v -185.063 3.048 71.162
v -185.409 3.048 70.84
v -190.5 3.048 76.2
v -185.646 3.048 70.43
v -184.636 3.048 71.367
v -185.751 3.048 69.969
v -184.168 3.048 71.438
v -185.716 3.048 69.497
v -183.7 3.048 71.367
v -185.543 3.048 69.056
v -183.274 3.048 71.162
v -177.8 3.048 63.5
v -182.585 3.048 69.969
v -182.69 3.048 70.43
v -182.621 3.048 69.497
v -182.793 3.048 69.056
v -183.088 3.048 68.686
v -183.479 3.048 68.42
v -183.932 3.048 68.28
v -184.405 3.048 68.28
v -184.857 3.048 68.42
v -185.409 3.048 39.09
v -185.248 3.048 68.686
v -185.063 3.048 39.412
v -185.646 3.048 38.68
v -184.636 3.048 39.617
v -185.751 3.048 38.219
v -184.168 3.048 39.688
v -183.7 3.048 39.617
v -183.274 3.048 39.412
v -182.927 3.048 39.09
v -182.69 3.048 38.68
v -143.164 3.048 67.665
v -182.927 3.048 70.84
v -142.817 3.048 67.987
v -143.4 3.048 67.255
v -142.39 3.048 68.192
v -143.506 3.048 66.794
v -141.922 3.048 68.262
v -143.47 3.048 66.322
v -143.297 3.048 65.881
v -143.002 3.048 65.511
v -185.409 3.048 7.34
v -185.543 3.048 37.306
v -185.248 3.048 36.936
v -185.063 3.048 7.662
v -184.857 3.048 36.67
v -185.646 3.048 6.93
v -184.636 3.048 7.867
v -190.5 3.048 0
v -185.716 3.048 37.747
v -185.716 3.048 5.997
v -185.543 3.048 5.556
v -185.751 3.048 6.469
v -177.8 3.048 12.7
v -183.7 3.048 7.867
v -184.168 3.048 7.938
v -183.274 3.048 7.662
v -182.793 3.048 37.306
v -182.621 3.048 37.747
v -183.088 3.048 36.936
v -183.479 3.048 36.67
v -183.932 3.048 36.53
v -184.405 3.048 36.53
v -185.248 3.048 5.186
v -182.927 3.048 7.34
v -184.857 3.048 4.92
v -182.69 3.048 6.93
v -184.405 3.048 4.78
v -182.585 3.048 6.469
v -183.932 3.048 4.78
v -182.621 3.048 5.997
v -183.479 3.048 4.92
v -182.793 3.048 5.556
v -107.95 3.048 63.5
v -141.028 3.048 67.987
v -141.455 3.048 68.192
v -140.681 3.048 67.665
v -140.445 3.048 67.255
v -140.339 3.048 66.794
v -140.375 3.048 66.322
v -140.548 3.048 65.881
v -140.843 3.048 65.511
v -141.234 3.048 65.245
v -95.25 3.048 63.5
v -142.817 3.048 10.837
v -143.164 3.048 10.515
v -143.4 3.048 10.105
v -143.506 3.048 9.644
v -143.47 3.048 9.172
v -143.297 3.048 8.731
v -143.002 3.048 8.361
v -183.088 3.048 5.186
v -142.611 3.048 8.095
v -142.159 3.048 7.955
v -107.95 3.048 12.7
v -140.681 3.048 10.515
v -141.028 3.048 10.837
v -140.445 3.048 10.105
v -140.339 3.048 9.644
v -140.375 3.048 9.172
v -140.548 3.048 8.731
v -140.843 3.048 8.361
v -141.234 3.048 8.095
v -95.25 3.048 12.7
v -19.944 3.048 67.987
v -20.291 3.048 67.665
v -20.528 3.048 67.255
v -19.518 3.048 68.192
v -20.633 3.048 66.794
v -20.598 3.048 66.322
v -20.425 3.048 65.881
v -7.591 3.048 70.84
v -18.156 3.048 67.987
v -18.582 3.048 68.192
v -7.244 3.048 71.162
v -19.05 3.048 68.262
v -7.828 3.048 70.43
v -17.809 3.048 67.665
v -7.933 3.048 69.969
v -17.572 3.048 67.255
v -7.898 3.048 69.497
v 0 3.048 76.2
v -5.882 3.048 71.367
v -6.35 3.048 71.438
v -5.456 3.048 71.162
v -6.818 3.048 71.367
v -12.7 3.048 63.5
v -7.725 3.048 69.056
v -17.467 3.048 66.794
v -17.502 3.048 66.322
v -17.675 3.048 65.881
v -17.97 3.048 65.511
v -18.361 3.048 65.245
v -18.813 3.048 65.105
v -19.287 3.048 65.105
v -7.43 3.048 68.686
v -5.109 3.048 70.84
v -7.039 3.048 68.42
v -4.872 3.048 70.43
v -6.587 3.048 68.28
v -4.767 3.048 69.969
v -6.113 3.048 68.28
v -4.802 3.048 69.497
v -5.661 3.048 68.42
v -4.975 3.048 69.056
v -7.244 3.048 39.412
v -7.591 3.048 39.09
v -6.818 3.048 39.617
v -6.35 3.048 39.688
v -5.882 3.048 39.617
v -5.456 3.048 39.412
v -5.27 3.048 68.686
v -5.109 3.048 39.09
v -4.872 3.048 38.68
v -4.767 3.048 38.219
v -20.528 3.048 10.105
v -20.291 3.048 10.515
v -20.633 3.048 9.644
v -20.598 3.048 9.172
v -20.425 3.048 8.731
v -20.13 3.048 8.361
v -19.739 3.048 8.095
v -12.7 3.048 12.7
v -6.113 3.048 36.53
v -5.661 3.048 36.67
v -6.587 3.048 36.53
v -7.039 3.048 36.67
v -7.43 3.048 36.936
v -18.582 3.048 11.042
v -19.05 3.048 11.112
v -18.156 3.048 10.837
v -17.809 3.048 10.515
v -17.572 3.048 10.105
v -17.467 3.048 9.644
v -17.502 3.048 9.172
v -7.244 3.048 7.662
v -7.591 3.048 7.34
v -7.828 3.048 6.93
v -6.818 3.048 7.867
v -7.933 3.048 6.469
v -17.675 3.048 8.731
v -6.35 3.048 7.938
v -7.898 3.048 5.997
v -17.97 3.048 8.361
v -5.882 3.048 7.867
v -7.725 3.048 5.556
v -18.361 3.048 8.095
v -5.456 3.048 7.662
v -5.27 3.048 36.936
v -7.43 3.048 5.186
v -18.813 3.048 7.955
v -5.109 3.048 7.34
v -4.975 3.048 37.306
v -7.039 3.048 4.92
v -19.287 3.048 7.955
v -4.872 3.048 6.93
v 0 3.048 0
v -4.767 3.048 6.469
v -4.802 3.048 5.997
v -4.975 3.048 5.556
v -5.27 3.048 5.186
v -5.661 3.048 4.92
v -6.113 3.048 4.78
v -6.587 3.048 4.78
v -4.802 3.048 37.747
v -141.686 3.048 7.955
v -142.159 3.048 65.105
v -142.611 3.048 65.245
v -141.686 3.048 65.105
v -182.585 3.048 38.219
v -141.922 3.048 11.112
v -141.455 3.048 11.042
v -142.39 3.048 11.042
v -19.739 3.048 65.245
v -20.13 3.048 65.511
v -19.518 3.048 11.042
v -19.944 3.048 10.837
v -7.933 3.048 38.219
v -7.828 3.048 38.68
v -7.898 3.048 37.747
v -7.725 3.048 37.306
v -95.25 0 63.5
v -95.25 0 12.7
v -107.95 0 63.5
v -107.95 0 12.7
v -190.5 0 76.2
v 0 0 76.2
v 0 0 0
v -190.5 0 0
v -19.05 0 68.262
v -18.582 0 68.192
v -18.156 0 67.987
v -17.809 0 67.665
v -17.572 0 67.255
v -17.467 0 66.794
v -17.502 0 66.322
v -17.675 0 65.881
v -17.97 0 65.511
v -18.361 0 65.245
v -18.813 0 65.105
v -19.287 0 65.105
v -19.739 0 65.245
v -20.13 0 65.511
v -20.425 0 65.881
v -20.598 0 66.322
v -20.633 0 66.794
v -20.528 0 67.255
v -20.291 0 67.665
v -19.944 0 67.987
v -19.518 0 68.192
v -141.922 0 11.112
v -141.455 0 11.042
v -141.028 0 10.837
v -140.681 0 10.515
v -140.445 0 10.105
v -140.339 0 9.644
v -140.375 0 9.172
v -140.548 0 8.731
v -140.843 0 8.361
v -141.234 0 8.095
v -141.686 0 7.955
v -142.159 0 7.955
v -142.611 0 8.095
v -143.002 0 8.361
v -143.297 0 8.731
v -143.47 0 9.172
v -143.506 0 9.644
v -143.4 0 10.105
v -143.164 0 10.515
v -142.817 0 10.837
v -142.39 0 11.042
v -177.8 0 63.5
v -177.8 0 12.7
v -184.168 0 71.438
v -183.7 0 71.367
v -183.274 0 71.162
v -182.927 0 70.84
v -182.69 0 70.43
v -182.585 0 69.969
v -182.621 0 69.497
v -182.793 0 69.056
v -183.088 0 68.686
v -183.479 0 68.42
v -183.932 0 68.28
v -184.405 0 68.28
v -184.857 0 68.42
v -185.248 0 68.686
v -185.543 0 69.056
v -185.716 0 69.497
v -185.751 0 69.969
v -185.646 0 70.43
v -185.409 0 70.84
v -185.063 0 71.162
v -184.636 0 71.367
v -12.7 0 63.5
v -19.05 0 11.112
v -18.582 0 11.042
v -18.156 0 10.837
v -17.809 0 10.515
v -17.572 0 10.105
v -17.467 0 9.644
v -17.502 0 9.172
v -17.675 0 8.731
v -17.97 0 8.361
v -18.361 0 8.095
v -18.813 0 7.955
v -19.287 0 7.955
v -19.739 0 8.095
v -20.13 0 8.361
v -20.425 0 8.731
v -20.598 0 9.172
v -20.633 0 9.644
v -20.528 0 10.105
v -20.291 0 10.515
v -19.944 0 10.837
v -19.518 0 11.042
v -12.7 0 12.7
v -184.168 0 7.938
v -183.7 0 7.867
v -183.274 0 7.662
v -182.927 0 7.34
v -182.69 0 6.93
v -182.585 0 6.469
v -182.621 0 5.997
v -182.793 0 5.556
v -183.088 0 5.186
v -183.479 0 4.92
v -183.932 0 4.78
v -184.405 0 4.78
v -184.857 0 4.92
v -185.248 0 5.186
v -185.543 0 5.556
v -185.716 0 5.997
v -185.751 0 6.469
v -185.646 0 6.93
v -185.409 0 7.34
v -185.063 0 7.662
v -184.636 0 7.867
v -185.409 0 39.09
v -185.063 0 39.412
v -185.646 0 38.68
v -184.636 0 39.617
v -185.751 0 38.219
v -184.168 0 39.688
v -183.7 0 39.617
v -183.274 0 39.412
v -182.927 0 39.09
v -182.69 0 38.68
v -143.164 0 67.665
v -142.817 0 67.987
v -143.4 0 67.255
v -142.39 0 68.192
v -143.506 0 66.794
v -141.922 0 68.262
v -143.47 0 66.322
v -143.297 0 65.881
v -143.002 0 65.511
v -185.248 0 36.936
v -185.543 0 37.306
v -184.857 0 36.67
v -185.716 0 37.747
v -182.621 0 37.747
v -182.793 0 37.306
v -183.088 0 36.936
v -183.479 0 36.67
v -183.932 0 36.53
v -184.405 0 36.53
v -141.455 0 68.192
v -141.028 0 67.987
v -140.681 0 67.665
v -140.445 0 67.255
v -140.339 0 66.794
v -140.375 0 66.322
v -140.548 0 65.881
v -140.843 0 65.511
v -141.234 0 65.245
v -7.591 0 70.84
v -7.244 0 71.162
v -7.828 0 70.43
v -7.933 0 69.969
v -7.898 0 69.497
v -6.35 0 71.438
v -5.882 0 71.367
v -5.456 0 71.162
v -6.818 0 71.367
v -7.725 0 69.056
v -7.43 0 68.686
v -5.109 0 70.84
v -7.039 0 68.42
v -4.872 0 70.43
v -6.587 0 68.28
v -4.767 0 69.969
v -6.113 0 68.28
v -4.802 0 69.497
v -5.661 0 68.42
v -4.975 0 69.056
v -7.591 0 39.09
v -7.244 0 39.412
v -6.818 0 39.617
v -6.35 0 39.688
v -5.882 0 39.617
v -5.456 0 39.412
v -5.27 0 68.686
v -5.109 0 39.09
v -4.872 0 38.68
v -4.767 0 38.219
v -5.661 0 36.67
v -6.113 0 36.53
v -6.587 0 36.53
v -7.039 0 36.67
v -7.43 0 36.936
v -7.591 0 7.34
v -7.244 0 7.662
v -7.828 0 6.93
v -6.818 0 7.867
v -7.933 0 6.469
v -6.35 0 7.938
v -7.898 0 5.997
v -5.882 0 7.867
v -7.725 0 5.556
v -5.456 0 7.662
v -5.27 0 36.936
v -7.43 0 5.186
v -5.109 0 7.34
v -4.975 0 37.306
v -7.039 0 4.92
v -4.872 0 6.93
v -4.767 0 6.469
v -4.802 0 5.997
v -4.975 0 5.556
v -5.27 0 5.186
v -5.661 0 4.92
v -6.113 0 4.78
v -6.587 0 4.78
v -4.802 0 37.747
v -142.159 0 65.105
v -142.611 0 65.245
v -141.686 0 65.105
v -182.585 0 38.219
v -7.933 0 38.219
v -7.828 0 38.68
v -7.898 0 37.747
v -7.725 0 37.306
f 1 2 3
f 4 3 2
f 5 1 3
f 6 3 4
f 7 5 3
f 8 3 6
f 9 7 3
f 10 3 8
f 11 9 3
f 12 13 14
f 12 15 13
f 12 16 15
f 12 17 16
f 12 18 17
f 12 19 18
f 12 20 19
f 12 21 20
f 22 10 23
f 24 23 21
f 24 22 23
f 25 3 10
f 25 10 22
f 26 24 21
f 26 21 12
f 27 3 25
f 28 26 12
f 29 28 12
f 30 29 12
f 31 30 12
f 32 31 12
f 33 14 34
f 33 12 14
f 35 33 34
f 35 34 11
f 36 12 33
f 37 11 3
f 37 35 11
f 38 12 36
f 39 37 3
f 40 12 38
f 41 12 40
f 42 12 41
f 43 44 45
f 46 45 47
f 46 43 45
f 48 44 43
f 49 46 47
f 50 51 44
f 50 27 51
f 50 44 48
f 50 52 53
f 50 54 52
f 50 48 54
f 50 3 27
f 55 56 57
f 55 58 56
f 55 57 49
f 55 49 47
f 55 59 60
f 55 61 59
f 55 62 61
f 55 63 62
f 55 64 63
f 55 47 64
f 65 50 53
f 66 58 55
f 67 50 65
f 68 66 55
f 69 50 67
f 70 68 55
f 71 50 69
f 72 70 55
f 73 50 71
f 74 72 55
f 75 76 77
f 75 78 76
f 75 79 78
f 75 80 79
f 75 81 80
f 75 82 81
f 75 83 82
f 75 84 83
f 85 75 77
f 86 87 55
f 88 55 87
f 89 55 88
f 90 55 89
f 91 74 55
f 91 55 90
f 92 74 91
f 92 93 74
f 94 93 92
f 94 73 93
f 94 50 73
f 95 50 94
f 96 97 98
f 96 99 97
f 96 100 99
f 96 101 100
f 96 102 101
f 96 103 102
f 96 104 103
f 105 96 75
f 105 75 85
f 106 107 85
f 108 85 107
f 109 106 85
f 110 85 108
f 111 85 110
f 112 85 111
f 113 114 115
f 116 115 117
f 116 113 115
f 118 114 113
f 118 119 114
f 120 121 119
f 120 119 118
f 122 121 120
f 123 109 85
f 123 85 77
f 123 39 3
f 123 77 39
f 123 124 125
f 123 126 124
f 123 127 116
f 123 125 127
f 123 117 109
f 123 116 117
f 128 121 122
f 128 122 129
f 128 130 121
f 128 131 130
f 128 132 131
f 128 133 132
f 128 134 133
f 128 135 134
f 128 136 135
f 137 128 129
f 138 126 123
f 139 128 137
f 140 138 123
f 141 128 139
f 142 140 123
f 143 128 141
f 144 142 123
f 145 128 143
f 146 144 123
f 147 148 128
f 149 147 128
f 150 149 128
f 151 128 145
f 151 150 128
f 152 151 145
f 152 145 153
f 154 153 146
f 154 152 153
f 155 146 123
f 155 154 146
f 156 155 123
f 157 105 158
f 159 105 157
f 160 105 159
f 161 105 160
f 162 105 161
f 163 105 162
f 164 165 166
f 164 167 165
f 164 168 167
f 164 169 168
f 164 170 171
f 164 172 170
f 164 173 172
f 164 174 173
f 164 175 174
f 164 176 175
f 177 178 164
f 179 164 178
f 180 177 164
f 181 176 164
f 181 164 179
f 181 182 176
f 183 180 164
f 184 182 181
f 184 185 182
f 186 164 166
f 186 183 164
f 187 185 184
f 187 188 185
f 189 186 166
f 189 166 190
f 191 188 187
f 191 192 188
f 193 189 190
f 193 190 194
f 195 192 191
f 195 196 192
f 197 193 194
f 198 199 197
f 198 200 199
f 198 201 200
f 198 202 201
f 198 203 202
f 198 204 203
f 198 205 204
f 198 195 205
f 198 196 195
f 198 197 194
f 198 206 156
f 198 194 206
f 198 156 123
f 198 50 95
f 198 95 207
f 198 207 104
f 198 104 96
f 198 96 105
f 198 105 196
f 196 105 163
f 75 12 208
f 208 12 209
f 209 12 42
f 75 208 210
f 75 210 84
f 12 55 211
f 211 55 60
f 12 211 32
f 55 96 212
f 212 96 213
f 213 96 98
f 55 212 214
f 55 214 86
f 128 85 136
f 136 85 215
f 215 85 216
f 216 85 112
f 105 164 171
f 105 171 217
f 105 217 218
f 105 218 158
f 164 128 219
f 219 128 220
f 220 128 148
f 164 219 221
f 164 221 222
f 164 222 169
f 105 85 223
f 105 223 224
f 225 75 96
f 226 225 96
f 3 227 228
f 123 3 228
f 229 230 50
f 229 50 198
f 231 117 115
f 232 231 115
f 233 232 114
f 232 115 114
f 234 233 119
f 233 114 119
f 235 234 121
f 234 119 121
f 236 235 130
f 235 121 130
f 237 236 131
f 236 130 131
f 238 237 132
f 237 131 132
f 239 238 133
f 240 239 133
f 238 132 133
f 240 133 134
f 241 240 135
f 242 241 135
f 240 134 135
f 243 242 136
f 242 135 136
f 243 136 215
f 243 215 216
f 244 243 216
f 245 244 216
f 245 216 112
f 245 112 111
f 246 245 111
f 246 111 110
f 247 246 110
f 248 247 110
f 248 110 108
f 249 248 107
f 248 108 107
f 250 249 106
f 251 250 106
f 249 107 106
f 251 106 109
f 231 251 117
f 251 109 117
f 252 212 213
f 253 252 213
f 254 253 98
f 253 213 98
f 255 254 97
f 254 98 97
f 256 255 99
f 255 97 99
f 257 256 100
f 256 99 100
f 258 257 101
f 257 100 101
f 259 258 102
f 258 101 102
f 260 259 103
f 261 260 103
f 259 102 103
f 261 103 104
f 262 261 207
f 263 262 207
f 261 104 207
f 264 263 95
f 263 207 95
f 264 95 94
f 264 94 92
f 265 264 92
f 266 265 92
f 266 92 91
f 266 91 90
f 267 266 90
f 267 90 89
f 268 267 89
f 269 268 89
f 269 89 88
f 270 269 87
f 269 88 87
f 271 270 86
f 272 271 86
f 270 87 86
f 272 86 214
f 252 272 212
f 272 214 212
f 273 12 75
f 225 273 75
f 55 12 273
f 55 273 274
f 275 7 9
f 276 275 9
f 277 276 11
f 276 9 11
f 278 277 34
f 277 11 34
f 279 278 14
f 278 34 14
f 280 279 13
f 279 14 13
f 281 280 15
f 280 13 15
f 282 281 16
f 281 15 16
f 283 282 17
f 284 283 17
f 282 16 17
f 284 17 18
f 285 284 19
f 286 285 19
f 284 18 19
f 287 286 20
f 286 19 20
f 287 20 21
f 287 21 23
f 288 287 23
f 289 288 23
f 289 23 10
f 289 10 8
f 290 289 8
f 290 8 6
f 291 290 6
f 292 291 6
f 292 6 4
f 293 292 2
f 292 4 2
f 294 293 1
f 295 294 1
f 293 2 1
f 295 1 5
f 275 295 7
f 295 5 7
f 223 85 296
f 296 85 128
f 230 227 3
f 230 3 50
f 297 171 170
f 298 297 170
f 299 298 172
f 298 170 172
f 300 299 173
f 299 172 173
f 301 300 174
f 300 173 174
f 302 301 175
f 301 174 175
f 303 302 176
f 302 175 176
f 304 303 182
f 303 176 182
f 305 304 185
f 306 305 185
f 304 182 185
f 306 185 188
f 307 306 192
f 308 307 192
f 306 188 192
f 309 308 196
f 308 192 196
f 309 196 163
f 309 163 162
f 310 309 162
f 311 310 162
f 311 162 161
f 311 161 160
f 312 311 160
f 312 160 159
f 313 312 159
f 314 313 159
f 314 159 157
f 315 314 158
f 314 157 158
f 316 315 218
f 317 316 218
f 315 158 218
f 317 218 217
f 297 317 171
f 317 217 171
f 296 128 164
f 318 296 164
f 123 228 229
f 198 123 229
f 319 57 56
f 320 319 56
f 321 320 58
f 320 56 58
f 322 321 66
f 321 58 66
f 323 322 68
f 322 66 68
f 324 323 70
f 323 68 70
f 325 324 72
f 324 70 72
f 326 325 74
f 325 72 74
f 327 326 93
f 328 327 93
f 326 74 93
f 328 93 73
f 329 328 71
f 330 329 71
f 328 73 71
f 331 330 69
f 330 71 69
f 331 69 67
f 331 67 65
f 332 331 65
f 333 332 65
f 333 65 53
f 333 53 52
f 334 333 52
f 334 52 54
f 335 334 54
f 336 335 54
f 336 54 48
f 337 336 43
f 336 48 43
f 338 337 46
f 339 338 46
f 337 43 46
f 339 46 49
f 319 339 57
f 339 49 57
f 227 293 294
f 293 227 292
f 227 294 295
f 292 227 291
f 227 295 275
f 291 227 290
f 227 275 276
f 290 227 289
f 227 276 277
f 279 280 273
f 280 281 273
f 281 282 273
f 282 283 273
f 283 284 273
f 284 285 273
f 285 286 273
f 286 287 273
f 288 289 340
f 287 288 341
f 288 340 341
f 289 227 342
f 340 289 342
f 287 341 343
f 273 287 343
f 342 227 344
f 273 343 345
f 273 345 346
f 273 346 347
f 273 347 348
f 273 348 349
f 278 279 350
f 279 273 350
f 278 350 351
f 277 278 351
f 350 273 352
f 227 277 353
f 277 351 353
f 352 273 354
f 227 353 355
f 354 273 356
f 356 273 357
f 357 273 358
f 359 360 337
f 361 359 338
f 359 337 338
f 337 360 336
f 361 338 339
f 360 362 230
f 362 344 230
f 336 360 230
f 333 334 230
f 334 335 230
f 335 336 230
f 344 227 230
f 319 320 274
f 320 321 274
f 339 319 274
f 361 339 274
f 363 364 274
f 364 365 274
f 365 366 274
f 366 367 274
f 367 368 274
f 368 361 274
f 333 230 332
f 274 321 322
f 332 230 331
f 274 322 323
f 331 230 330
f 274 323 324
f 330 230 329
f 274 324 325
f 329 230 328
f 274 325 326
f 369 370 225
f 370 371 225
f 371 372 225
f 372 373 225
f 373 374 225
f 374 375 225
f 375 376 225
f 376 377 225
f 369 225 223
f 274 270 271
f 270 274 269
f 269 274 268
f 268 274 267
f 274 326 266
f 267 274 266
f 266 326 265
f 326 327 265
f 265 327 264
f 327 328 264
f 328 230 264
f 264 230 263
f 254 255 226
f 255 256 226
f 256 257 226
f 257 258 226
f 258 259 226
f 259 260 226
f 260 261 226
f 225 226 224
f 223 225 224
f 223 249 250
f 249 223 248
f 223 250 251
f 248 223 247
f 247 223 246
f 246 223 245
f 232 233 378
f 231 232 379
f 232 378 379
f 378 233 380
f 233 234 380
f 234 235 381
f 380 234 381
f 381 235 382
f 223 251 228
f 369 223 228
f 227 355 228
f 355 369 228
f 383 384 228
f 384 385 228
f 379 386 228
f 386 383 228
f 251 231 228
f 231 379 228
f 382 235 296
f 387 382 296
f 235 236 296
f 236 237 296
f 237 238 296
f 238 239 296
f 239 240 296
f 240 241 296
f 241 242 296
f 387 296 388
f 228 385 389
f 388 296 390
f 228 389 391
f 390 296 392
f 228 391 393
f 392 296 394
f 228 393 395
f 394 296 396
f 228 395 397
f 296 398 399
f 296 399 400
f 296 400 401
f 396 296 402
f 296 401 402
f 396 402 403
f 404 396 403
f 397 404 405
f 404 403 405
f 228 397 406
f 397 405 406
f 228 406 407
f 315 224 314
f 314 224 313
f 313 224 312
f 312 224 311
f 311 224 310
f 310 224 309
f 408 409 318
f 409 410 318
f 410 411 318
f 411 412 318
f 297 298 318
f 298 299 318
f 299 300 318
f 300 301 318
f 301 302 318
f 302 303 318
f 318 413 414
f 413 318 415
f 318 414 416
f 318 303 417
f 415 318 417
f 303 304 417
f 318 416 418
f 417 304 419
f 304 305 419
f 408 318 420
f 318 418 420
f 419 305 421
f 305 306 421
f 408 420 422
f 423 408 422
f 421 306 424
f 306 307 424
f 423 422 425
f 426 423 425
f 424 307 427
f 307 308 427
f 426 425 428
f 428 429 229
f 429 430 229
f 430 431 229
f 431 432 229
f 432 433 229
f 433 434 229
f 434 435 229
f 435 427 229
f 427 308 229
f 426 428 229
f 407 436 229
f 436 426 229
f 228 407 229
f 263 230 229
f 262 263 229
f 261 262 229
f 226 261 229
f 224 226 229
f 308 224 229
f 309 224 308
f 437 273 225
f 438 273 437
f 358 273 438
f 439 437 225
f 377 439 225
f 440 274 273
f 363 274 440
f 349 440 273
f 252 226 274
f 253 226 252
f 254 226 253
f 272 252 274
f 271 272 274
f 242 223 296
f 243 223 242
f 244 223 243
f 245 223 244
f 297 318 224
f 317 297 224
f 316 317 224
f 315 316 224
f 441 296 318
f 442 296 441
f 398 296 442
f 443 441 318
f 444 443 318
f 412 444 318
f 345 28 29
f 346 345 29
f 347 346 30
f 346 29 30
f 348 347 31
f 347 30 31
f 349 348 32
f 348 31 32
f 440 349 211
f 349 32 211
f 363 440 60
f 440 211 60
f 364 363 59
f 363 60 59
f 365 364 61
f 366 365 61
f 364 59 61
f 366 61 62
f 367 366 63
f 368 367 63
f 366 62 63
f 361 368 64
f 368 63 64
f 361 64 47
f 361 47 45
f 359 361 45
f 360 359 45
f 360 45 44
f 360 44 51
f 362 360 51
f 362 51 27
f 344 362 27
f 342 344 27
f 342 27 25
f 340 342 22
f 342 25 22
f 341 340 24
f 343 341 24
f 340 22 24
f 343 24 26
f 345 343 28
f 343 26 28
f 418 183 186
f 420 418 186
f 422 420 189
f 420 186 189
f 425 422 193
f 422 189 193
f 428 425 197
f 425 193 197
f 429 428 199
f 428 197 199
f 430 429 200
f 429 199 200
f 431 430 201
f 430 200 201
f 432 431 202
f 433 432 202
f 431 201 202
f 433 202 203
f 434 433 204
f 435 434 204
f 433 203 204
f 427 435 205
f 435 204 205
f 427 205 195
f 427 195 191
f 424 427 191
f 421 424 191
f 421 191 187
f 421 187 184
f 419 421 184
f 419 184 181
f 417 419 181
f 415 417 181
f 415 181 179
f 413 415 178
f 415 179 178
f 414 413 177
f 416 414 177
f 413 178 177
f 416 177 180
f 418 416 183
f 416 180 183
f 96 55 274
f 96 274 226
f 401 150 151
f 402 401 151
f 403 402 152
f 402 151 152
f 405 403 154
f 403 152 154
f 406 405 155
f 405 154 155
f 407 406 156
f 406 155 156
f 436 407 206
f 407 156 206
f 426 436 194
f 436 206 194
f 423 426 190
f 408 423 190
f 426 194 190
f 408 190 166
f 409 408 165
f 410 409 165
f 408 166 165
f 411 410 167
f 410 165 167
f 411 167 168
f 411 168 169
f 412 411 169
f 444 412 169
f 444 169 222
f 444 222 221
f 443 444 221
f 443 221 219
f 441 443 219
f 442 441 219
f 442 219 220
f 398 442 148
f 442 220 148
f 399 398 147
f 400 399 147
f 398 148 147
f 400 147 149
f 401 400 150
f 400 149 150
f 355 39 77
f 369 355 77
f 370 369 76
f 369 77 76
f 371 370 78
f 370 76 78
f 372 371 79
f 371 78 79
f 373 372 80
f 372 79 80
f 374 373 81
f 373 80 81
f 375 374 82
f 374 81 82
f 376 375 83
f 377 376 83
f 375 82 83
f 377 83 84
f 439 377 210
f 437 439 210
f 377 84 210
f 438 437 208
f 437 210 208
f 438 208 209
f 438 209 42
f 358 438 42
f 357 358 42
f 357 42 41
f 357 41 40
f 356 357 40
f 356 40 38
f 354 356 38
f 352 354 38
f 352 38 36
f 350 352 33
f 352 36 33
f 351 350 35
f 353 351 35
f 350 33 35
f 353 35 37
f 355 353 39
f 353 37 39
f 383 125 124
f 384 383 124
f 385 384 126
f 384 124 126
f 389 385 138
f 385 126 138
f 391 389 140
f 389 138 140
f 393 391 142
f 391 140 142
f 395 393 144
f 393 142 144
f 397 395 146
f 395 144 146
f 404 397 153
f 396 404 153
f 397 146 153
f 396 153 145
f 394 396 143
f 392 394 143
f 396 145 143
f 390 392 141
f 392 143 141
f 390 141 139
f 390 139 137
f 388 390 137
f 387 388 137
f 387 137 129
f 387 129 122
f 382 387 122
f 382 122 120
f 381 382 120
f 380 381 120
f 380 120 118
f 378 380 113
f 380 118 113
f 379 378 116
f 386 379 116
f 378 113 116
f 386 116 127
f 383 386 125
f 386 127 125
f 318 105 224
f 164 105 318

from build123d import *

# Parameters (mm, degrees)
SKETCH1_W           = 190.5
SKETCH1_H           = 76.2
BOSS_EXTRUDE1_DEPTH = 3.048
SKETCH2_W           = 82.55
SKETCH2_H           = 50.8
SKETCH2_W_2         = 69.85
CUT_EXTRUDE1_DEPTH  = 3.048
SKETCH3_R           = 1.5875
CUT_EXTRUDE2_DEPTH  = 3.048


with BuildPart() as part:
    # Sketch1 → Boss-Extrude1 (new body)
    with BuildSketch(Plane(origin=(0, 0, 0), x_dir=(1, 0, 0), z_dir=(0, 1, 0))):
        with Locations((-95.25, -38.1)):
            Rectangle(SKETCH1_W, SKETCH1_H)
    extrude(amount=BOSS_EXTRUDE1_DEPTH)

    # Sketch2 → Cut-Extrude1 (cut)
    with BuildSketch(Plane(origin=(0, 3.048, 0), x_dir=(1, 0, 0), z_dir=(0, 1, 0))):
        with Locations((-53.975, -38.1)):
            Rectangle(SKETCH2_W, SKETCH2_H)
        with Locations((-142.875, -38.1)):
            Rectangle(SKETCH2_W_2, SKETCH2_H)
    extrude(amount=-CUT_EXTRUDE1_DEPTH, mode=Mode.SUBTRACT)

    # Sketch3 → Cut-Extrude2 (cut)
    with BuildSketch(Plane(origin=(0, 3.048, 0), x_dir=(1, 0, 0), z_dir=(0, 1, 0))):
        with Locations(Location((-6.35, -38.1, 0), (0, 0, 270))):
            Circle(SKETCH3_R)
        with Locations(Location((-184.168238783, -38.1, 0), (0, 0, 270))):
            Circle(SKETCH3_R)
        with Locations(Location((-6.35, -6.35, 0), (0, 0, 270))):
            Circle(SKETCH3_R)
        with Locations(Location((-184.168238783, -6.35, 0), (0, 0, 270))):
            Circle(SKETCH3_R)
        with Locations(Location((-184.168238783, -69.85, 0), (0, 0, 270))):
            Circle(SKETCH3_R)
        with Locations(Location((-6.35, -69.85, 0), (0, 0, 270))):
            Circle(SKETCH3_R)
        with Locations(Location((-19.05, -9.525, 0), (0, 0, 270))):
            Circle(SKETCH3_R)
        with Locations(Location((-19.05, -66.675, 0), (0, 0, 270))):
            Circle(SKETCH3_R)
        with Locations(Location((-141.9225, -9.525, 0), (0, 0, 270))):
            Circle(SKETCH3_R)
        with Locations(Location((-141.9225, -66.675, 0), (0, 0, 270))):
            Circle(SKETCH3_R)
    extrude(amount=-CUT_EXTRUDE2_DEPTH, mode=Mode.SUBTRACT)


solid = part.part
